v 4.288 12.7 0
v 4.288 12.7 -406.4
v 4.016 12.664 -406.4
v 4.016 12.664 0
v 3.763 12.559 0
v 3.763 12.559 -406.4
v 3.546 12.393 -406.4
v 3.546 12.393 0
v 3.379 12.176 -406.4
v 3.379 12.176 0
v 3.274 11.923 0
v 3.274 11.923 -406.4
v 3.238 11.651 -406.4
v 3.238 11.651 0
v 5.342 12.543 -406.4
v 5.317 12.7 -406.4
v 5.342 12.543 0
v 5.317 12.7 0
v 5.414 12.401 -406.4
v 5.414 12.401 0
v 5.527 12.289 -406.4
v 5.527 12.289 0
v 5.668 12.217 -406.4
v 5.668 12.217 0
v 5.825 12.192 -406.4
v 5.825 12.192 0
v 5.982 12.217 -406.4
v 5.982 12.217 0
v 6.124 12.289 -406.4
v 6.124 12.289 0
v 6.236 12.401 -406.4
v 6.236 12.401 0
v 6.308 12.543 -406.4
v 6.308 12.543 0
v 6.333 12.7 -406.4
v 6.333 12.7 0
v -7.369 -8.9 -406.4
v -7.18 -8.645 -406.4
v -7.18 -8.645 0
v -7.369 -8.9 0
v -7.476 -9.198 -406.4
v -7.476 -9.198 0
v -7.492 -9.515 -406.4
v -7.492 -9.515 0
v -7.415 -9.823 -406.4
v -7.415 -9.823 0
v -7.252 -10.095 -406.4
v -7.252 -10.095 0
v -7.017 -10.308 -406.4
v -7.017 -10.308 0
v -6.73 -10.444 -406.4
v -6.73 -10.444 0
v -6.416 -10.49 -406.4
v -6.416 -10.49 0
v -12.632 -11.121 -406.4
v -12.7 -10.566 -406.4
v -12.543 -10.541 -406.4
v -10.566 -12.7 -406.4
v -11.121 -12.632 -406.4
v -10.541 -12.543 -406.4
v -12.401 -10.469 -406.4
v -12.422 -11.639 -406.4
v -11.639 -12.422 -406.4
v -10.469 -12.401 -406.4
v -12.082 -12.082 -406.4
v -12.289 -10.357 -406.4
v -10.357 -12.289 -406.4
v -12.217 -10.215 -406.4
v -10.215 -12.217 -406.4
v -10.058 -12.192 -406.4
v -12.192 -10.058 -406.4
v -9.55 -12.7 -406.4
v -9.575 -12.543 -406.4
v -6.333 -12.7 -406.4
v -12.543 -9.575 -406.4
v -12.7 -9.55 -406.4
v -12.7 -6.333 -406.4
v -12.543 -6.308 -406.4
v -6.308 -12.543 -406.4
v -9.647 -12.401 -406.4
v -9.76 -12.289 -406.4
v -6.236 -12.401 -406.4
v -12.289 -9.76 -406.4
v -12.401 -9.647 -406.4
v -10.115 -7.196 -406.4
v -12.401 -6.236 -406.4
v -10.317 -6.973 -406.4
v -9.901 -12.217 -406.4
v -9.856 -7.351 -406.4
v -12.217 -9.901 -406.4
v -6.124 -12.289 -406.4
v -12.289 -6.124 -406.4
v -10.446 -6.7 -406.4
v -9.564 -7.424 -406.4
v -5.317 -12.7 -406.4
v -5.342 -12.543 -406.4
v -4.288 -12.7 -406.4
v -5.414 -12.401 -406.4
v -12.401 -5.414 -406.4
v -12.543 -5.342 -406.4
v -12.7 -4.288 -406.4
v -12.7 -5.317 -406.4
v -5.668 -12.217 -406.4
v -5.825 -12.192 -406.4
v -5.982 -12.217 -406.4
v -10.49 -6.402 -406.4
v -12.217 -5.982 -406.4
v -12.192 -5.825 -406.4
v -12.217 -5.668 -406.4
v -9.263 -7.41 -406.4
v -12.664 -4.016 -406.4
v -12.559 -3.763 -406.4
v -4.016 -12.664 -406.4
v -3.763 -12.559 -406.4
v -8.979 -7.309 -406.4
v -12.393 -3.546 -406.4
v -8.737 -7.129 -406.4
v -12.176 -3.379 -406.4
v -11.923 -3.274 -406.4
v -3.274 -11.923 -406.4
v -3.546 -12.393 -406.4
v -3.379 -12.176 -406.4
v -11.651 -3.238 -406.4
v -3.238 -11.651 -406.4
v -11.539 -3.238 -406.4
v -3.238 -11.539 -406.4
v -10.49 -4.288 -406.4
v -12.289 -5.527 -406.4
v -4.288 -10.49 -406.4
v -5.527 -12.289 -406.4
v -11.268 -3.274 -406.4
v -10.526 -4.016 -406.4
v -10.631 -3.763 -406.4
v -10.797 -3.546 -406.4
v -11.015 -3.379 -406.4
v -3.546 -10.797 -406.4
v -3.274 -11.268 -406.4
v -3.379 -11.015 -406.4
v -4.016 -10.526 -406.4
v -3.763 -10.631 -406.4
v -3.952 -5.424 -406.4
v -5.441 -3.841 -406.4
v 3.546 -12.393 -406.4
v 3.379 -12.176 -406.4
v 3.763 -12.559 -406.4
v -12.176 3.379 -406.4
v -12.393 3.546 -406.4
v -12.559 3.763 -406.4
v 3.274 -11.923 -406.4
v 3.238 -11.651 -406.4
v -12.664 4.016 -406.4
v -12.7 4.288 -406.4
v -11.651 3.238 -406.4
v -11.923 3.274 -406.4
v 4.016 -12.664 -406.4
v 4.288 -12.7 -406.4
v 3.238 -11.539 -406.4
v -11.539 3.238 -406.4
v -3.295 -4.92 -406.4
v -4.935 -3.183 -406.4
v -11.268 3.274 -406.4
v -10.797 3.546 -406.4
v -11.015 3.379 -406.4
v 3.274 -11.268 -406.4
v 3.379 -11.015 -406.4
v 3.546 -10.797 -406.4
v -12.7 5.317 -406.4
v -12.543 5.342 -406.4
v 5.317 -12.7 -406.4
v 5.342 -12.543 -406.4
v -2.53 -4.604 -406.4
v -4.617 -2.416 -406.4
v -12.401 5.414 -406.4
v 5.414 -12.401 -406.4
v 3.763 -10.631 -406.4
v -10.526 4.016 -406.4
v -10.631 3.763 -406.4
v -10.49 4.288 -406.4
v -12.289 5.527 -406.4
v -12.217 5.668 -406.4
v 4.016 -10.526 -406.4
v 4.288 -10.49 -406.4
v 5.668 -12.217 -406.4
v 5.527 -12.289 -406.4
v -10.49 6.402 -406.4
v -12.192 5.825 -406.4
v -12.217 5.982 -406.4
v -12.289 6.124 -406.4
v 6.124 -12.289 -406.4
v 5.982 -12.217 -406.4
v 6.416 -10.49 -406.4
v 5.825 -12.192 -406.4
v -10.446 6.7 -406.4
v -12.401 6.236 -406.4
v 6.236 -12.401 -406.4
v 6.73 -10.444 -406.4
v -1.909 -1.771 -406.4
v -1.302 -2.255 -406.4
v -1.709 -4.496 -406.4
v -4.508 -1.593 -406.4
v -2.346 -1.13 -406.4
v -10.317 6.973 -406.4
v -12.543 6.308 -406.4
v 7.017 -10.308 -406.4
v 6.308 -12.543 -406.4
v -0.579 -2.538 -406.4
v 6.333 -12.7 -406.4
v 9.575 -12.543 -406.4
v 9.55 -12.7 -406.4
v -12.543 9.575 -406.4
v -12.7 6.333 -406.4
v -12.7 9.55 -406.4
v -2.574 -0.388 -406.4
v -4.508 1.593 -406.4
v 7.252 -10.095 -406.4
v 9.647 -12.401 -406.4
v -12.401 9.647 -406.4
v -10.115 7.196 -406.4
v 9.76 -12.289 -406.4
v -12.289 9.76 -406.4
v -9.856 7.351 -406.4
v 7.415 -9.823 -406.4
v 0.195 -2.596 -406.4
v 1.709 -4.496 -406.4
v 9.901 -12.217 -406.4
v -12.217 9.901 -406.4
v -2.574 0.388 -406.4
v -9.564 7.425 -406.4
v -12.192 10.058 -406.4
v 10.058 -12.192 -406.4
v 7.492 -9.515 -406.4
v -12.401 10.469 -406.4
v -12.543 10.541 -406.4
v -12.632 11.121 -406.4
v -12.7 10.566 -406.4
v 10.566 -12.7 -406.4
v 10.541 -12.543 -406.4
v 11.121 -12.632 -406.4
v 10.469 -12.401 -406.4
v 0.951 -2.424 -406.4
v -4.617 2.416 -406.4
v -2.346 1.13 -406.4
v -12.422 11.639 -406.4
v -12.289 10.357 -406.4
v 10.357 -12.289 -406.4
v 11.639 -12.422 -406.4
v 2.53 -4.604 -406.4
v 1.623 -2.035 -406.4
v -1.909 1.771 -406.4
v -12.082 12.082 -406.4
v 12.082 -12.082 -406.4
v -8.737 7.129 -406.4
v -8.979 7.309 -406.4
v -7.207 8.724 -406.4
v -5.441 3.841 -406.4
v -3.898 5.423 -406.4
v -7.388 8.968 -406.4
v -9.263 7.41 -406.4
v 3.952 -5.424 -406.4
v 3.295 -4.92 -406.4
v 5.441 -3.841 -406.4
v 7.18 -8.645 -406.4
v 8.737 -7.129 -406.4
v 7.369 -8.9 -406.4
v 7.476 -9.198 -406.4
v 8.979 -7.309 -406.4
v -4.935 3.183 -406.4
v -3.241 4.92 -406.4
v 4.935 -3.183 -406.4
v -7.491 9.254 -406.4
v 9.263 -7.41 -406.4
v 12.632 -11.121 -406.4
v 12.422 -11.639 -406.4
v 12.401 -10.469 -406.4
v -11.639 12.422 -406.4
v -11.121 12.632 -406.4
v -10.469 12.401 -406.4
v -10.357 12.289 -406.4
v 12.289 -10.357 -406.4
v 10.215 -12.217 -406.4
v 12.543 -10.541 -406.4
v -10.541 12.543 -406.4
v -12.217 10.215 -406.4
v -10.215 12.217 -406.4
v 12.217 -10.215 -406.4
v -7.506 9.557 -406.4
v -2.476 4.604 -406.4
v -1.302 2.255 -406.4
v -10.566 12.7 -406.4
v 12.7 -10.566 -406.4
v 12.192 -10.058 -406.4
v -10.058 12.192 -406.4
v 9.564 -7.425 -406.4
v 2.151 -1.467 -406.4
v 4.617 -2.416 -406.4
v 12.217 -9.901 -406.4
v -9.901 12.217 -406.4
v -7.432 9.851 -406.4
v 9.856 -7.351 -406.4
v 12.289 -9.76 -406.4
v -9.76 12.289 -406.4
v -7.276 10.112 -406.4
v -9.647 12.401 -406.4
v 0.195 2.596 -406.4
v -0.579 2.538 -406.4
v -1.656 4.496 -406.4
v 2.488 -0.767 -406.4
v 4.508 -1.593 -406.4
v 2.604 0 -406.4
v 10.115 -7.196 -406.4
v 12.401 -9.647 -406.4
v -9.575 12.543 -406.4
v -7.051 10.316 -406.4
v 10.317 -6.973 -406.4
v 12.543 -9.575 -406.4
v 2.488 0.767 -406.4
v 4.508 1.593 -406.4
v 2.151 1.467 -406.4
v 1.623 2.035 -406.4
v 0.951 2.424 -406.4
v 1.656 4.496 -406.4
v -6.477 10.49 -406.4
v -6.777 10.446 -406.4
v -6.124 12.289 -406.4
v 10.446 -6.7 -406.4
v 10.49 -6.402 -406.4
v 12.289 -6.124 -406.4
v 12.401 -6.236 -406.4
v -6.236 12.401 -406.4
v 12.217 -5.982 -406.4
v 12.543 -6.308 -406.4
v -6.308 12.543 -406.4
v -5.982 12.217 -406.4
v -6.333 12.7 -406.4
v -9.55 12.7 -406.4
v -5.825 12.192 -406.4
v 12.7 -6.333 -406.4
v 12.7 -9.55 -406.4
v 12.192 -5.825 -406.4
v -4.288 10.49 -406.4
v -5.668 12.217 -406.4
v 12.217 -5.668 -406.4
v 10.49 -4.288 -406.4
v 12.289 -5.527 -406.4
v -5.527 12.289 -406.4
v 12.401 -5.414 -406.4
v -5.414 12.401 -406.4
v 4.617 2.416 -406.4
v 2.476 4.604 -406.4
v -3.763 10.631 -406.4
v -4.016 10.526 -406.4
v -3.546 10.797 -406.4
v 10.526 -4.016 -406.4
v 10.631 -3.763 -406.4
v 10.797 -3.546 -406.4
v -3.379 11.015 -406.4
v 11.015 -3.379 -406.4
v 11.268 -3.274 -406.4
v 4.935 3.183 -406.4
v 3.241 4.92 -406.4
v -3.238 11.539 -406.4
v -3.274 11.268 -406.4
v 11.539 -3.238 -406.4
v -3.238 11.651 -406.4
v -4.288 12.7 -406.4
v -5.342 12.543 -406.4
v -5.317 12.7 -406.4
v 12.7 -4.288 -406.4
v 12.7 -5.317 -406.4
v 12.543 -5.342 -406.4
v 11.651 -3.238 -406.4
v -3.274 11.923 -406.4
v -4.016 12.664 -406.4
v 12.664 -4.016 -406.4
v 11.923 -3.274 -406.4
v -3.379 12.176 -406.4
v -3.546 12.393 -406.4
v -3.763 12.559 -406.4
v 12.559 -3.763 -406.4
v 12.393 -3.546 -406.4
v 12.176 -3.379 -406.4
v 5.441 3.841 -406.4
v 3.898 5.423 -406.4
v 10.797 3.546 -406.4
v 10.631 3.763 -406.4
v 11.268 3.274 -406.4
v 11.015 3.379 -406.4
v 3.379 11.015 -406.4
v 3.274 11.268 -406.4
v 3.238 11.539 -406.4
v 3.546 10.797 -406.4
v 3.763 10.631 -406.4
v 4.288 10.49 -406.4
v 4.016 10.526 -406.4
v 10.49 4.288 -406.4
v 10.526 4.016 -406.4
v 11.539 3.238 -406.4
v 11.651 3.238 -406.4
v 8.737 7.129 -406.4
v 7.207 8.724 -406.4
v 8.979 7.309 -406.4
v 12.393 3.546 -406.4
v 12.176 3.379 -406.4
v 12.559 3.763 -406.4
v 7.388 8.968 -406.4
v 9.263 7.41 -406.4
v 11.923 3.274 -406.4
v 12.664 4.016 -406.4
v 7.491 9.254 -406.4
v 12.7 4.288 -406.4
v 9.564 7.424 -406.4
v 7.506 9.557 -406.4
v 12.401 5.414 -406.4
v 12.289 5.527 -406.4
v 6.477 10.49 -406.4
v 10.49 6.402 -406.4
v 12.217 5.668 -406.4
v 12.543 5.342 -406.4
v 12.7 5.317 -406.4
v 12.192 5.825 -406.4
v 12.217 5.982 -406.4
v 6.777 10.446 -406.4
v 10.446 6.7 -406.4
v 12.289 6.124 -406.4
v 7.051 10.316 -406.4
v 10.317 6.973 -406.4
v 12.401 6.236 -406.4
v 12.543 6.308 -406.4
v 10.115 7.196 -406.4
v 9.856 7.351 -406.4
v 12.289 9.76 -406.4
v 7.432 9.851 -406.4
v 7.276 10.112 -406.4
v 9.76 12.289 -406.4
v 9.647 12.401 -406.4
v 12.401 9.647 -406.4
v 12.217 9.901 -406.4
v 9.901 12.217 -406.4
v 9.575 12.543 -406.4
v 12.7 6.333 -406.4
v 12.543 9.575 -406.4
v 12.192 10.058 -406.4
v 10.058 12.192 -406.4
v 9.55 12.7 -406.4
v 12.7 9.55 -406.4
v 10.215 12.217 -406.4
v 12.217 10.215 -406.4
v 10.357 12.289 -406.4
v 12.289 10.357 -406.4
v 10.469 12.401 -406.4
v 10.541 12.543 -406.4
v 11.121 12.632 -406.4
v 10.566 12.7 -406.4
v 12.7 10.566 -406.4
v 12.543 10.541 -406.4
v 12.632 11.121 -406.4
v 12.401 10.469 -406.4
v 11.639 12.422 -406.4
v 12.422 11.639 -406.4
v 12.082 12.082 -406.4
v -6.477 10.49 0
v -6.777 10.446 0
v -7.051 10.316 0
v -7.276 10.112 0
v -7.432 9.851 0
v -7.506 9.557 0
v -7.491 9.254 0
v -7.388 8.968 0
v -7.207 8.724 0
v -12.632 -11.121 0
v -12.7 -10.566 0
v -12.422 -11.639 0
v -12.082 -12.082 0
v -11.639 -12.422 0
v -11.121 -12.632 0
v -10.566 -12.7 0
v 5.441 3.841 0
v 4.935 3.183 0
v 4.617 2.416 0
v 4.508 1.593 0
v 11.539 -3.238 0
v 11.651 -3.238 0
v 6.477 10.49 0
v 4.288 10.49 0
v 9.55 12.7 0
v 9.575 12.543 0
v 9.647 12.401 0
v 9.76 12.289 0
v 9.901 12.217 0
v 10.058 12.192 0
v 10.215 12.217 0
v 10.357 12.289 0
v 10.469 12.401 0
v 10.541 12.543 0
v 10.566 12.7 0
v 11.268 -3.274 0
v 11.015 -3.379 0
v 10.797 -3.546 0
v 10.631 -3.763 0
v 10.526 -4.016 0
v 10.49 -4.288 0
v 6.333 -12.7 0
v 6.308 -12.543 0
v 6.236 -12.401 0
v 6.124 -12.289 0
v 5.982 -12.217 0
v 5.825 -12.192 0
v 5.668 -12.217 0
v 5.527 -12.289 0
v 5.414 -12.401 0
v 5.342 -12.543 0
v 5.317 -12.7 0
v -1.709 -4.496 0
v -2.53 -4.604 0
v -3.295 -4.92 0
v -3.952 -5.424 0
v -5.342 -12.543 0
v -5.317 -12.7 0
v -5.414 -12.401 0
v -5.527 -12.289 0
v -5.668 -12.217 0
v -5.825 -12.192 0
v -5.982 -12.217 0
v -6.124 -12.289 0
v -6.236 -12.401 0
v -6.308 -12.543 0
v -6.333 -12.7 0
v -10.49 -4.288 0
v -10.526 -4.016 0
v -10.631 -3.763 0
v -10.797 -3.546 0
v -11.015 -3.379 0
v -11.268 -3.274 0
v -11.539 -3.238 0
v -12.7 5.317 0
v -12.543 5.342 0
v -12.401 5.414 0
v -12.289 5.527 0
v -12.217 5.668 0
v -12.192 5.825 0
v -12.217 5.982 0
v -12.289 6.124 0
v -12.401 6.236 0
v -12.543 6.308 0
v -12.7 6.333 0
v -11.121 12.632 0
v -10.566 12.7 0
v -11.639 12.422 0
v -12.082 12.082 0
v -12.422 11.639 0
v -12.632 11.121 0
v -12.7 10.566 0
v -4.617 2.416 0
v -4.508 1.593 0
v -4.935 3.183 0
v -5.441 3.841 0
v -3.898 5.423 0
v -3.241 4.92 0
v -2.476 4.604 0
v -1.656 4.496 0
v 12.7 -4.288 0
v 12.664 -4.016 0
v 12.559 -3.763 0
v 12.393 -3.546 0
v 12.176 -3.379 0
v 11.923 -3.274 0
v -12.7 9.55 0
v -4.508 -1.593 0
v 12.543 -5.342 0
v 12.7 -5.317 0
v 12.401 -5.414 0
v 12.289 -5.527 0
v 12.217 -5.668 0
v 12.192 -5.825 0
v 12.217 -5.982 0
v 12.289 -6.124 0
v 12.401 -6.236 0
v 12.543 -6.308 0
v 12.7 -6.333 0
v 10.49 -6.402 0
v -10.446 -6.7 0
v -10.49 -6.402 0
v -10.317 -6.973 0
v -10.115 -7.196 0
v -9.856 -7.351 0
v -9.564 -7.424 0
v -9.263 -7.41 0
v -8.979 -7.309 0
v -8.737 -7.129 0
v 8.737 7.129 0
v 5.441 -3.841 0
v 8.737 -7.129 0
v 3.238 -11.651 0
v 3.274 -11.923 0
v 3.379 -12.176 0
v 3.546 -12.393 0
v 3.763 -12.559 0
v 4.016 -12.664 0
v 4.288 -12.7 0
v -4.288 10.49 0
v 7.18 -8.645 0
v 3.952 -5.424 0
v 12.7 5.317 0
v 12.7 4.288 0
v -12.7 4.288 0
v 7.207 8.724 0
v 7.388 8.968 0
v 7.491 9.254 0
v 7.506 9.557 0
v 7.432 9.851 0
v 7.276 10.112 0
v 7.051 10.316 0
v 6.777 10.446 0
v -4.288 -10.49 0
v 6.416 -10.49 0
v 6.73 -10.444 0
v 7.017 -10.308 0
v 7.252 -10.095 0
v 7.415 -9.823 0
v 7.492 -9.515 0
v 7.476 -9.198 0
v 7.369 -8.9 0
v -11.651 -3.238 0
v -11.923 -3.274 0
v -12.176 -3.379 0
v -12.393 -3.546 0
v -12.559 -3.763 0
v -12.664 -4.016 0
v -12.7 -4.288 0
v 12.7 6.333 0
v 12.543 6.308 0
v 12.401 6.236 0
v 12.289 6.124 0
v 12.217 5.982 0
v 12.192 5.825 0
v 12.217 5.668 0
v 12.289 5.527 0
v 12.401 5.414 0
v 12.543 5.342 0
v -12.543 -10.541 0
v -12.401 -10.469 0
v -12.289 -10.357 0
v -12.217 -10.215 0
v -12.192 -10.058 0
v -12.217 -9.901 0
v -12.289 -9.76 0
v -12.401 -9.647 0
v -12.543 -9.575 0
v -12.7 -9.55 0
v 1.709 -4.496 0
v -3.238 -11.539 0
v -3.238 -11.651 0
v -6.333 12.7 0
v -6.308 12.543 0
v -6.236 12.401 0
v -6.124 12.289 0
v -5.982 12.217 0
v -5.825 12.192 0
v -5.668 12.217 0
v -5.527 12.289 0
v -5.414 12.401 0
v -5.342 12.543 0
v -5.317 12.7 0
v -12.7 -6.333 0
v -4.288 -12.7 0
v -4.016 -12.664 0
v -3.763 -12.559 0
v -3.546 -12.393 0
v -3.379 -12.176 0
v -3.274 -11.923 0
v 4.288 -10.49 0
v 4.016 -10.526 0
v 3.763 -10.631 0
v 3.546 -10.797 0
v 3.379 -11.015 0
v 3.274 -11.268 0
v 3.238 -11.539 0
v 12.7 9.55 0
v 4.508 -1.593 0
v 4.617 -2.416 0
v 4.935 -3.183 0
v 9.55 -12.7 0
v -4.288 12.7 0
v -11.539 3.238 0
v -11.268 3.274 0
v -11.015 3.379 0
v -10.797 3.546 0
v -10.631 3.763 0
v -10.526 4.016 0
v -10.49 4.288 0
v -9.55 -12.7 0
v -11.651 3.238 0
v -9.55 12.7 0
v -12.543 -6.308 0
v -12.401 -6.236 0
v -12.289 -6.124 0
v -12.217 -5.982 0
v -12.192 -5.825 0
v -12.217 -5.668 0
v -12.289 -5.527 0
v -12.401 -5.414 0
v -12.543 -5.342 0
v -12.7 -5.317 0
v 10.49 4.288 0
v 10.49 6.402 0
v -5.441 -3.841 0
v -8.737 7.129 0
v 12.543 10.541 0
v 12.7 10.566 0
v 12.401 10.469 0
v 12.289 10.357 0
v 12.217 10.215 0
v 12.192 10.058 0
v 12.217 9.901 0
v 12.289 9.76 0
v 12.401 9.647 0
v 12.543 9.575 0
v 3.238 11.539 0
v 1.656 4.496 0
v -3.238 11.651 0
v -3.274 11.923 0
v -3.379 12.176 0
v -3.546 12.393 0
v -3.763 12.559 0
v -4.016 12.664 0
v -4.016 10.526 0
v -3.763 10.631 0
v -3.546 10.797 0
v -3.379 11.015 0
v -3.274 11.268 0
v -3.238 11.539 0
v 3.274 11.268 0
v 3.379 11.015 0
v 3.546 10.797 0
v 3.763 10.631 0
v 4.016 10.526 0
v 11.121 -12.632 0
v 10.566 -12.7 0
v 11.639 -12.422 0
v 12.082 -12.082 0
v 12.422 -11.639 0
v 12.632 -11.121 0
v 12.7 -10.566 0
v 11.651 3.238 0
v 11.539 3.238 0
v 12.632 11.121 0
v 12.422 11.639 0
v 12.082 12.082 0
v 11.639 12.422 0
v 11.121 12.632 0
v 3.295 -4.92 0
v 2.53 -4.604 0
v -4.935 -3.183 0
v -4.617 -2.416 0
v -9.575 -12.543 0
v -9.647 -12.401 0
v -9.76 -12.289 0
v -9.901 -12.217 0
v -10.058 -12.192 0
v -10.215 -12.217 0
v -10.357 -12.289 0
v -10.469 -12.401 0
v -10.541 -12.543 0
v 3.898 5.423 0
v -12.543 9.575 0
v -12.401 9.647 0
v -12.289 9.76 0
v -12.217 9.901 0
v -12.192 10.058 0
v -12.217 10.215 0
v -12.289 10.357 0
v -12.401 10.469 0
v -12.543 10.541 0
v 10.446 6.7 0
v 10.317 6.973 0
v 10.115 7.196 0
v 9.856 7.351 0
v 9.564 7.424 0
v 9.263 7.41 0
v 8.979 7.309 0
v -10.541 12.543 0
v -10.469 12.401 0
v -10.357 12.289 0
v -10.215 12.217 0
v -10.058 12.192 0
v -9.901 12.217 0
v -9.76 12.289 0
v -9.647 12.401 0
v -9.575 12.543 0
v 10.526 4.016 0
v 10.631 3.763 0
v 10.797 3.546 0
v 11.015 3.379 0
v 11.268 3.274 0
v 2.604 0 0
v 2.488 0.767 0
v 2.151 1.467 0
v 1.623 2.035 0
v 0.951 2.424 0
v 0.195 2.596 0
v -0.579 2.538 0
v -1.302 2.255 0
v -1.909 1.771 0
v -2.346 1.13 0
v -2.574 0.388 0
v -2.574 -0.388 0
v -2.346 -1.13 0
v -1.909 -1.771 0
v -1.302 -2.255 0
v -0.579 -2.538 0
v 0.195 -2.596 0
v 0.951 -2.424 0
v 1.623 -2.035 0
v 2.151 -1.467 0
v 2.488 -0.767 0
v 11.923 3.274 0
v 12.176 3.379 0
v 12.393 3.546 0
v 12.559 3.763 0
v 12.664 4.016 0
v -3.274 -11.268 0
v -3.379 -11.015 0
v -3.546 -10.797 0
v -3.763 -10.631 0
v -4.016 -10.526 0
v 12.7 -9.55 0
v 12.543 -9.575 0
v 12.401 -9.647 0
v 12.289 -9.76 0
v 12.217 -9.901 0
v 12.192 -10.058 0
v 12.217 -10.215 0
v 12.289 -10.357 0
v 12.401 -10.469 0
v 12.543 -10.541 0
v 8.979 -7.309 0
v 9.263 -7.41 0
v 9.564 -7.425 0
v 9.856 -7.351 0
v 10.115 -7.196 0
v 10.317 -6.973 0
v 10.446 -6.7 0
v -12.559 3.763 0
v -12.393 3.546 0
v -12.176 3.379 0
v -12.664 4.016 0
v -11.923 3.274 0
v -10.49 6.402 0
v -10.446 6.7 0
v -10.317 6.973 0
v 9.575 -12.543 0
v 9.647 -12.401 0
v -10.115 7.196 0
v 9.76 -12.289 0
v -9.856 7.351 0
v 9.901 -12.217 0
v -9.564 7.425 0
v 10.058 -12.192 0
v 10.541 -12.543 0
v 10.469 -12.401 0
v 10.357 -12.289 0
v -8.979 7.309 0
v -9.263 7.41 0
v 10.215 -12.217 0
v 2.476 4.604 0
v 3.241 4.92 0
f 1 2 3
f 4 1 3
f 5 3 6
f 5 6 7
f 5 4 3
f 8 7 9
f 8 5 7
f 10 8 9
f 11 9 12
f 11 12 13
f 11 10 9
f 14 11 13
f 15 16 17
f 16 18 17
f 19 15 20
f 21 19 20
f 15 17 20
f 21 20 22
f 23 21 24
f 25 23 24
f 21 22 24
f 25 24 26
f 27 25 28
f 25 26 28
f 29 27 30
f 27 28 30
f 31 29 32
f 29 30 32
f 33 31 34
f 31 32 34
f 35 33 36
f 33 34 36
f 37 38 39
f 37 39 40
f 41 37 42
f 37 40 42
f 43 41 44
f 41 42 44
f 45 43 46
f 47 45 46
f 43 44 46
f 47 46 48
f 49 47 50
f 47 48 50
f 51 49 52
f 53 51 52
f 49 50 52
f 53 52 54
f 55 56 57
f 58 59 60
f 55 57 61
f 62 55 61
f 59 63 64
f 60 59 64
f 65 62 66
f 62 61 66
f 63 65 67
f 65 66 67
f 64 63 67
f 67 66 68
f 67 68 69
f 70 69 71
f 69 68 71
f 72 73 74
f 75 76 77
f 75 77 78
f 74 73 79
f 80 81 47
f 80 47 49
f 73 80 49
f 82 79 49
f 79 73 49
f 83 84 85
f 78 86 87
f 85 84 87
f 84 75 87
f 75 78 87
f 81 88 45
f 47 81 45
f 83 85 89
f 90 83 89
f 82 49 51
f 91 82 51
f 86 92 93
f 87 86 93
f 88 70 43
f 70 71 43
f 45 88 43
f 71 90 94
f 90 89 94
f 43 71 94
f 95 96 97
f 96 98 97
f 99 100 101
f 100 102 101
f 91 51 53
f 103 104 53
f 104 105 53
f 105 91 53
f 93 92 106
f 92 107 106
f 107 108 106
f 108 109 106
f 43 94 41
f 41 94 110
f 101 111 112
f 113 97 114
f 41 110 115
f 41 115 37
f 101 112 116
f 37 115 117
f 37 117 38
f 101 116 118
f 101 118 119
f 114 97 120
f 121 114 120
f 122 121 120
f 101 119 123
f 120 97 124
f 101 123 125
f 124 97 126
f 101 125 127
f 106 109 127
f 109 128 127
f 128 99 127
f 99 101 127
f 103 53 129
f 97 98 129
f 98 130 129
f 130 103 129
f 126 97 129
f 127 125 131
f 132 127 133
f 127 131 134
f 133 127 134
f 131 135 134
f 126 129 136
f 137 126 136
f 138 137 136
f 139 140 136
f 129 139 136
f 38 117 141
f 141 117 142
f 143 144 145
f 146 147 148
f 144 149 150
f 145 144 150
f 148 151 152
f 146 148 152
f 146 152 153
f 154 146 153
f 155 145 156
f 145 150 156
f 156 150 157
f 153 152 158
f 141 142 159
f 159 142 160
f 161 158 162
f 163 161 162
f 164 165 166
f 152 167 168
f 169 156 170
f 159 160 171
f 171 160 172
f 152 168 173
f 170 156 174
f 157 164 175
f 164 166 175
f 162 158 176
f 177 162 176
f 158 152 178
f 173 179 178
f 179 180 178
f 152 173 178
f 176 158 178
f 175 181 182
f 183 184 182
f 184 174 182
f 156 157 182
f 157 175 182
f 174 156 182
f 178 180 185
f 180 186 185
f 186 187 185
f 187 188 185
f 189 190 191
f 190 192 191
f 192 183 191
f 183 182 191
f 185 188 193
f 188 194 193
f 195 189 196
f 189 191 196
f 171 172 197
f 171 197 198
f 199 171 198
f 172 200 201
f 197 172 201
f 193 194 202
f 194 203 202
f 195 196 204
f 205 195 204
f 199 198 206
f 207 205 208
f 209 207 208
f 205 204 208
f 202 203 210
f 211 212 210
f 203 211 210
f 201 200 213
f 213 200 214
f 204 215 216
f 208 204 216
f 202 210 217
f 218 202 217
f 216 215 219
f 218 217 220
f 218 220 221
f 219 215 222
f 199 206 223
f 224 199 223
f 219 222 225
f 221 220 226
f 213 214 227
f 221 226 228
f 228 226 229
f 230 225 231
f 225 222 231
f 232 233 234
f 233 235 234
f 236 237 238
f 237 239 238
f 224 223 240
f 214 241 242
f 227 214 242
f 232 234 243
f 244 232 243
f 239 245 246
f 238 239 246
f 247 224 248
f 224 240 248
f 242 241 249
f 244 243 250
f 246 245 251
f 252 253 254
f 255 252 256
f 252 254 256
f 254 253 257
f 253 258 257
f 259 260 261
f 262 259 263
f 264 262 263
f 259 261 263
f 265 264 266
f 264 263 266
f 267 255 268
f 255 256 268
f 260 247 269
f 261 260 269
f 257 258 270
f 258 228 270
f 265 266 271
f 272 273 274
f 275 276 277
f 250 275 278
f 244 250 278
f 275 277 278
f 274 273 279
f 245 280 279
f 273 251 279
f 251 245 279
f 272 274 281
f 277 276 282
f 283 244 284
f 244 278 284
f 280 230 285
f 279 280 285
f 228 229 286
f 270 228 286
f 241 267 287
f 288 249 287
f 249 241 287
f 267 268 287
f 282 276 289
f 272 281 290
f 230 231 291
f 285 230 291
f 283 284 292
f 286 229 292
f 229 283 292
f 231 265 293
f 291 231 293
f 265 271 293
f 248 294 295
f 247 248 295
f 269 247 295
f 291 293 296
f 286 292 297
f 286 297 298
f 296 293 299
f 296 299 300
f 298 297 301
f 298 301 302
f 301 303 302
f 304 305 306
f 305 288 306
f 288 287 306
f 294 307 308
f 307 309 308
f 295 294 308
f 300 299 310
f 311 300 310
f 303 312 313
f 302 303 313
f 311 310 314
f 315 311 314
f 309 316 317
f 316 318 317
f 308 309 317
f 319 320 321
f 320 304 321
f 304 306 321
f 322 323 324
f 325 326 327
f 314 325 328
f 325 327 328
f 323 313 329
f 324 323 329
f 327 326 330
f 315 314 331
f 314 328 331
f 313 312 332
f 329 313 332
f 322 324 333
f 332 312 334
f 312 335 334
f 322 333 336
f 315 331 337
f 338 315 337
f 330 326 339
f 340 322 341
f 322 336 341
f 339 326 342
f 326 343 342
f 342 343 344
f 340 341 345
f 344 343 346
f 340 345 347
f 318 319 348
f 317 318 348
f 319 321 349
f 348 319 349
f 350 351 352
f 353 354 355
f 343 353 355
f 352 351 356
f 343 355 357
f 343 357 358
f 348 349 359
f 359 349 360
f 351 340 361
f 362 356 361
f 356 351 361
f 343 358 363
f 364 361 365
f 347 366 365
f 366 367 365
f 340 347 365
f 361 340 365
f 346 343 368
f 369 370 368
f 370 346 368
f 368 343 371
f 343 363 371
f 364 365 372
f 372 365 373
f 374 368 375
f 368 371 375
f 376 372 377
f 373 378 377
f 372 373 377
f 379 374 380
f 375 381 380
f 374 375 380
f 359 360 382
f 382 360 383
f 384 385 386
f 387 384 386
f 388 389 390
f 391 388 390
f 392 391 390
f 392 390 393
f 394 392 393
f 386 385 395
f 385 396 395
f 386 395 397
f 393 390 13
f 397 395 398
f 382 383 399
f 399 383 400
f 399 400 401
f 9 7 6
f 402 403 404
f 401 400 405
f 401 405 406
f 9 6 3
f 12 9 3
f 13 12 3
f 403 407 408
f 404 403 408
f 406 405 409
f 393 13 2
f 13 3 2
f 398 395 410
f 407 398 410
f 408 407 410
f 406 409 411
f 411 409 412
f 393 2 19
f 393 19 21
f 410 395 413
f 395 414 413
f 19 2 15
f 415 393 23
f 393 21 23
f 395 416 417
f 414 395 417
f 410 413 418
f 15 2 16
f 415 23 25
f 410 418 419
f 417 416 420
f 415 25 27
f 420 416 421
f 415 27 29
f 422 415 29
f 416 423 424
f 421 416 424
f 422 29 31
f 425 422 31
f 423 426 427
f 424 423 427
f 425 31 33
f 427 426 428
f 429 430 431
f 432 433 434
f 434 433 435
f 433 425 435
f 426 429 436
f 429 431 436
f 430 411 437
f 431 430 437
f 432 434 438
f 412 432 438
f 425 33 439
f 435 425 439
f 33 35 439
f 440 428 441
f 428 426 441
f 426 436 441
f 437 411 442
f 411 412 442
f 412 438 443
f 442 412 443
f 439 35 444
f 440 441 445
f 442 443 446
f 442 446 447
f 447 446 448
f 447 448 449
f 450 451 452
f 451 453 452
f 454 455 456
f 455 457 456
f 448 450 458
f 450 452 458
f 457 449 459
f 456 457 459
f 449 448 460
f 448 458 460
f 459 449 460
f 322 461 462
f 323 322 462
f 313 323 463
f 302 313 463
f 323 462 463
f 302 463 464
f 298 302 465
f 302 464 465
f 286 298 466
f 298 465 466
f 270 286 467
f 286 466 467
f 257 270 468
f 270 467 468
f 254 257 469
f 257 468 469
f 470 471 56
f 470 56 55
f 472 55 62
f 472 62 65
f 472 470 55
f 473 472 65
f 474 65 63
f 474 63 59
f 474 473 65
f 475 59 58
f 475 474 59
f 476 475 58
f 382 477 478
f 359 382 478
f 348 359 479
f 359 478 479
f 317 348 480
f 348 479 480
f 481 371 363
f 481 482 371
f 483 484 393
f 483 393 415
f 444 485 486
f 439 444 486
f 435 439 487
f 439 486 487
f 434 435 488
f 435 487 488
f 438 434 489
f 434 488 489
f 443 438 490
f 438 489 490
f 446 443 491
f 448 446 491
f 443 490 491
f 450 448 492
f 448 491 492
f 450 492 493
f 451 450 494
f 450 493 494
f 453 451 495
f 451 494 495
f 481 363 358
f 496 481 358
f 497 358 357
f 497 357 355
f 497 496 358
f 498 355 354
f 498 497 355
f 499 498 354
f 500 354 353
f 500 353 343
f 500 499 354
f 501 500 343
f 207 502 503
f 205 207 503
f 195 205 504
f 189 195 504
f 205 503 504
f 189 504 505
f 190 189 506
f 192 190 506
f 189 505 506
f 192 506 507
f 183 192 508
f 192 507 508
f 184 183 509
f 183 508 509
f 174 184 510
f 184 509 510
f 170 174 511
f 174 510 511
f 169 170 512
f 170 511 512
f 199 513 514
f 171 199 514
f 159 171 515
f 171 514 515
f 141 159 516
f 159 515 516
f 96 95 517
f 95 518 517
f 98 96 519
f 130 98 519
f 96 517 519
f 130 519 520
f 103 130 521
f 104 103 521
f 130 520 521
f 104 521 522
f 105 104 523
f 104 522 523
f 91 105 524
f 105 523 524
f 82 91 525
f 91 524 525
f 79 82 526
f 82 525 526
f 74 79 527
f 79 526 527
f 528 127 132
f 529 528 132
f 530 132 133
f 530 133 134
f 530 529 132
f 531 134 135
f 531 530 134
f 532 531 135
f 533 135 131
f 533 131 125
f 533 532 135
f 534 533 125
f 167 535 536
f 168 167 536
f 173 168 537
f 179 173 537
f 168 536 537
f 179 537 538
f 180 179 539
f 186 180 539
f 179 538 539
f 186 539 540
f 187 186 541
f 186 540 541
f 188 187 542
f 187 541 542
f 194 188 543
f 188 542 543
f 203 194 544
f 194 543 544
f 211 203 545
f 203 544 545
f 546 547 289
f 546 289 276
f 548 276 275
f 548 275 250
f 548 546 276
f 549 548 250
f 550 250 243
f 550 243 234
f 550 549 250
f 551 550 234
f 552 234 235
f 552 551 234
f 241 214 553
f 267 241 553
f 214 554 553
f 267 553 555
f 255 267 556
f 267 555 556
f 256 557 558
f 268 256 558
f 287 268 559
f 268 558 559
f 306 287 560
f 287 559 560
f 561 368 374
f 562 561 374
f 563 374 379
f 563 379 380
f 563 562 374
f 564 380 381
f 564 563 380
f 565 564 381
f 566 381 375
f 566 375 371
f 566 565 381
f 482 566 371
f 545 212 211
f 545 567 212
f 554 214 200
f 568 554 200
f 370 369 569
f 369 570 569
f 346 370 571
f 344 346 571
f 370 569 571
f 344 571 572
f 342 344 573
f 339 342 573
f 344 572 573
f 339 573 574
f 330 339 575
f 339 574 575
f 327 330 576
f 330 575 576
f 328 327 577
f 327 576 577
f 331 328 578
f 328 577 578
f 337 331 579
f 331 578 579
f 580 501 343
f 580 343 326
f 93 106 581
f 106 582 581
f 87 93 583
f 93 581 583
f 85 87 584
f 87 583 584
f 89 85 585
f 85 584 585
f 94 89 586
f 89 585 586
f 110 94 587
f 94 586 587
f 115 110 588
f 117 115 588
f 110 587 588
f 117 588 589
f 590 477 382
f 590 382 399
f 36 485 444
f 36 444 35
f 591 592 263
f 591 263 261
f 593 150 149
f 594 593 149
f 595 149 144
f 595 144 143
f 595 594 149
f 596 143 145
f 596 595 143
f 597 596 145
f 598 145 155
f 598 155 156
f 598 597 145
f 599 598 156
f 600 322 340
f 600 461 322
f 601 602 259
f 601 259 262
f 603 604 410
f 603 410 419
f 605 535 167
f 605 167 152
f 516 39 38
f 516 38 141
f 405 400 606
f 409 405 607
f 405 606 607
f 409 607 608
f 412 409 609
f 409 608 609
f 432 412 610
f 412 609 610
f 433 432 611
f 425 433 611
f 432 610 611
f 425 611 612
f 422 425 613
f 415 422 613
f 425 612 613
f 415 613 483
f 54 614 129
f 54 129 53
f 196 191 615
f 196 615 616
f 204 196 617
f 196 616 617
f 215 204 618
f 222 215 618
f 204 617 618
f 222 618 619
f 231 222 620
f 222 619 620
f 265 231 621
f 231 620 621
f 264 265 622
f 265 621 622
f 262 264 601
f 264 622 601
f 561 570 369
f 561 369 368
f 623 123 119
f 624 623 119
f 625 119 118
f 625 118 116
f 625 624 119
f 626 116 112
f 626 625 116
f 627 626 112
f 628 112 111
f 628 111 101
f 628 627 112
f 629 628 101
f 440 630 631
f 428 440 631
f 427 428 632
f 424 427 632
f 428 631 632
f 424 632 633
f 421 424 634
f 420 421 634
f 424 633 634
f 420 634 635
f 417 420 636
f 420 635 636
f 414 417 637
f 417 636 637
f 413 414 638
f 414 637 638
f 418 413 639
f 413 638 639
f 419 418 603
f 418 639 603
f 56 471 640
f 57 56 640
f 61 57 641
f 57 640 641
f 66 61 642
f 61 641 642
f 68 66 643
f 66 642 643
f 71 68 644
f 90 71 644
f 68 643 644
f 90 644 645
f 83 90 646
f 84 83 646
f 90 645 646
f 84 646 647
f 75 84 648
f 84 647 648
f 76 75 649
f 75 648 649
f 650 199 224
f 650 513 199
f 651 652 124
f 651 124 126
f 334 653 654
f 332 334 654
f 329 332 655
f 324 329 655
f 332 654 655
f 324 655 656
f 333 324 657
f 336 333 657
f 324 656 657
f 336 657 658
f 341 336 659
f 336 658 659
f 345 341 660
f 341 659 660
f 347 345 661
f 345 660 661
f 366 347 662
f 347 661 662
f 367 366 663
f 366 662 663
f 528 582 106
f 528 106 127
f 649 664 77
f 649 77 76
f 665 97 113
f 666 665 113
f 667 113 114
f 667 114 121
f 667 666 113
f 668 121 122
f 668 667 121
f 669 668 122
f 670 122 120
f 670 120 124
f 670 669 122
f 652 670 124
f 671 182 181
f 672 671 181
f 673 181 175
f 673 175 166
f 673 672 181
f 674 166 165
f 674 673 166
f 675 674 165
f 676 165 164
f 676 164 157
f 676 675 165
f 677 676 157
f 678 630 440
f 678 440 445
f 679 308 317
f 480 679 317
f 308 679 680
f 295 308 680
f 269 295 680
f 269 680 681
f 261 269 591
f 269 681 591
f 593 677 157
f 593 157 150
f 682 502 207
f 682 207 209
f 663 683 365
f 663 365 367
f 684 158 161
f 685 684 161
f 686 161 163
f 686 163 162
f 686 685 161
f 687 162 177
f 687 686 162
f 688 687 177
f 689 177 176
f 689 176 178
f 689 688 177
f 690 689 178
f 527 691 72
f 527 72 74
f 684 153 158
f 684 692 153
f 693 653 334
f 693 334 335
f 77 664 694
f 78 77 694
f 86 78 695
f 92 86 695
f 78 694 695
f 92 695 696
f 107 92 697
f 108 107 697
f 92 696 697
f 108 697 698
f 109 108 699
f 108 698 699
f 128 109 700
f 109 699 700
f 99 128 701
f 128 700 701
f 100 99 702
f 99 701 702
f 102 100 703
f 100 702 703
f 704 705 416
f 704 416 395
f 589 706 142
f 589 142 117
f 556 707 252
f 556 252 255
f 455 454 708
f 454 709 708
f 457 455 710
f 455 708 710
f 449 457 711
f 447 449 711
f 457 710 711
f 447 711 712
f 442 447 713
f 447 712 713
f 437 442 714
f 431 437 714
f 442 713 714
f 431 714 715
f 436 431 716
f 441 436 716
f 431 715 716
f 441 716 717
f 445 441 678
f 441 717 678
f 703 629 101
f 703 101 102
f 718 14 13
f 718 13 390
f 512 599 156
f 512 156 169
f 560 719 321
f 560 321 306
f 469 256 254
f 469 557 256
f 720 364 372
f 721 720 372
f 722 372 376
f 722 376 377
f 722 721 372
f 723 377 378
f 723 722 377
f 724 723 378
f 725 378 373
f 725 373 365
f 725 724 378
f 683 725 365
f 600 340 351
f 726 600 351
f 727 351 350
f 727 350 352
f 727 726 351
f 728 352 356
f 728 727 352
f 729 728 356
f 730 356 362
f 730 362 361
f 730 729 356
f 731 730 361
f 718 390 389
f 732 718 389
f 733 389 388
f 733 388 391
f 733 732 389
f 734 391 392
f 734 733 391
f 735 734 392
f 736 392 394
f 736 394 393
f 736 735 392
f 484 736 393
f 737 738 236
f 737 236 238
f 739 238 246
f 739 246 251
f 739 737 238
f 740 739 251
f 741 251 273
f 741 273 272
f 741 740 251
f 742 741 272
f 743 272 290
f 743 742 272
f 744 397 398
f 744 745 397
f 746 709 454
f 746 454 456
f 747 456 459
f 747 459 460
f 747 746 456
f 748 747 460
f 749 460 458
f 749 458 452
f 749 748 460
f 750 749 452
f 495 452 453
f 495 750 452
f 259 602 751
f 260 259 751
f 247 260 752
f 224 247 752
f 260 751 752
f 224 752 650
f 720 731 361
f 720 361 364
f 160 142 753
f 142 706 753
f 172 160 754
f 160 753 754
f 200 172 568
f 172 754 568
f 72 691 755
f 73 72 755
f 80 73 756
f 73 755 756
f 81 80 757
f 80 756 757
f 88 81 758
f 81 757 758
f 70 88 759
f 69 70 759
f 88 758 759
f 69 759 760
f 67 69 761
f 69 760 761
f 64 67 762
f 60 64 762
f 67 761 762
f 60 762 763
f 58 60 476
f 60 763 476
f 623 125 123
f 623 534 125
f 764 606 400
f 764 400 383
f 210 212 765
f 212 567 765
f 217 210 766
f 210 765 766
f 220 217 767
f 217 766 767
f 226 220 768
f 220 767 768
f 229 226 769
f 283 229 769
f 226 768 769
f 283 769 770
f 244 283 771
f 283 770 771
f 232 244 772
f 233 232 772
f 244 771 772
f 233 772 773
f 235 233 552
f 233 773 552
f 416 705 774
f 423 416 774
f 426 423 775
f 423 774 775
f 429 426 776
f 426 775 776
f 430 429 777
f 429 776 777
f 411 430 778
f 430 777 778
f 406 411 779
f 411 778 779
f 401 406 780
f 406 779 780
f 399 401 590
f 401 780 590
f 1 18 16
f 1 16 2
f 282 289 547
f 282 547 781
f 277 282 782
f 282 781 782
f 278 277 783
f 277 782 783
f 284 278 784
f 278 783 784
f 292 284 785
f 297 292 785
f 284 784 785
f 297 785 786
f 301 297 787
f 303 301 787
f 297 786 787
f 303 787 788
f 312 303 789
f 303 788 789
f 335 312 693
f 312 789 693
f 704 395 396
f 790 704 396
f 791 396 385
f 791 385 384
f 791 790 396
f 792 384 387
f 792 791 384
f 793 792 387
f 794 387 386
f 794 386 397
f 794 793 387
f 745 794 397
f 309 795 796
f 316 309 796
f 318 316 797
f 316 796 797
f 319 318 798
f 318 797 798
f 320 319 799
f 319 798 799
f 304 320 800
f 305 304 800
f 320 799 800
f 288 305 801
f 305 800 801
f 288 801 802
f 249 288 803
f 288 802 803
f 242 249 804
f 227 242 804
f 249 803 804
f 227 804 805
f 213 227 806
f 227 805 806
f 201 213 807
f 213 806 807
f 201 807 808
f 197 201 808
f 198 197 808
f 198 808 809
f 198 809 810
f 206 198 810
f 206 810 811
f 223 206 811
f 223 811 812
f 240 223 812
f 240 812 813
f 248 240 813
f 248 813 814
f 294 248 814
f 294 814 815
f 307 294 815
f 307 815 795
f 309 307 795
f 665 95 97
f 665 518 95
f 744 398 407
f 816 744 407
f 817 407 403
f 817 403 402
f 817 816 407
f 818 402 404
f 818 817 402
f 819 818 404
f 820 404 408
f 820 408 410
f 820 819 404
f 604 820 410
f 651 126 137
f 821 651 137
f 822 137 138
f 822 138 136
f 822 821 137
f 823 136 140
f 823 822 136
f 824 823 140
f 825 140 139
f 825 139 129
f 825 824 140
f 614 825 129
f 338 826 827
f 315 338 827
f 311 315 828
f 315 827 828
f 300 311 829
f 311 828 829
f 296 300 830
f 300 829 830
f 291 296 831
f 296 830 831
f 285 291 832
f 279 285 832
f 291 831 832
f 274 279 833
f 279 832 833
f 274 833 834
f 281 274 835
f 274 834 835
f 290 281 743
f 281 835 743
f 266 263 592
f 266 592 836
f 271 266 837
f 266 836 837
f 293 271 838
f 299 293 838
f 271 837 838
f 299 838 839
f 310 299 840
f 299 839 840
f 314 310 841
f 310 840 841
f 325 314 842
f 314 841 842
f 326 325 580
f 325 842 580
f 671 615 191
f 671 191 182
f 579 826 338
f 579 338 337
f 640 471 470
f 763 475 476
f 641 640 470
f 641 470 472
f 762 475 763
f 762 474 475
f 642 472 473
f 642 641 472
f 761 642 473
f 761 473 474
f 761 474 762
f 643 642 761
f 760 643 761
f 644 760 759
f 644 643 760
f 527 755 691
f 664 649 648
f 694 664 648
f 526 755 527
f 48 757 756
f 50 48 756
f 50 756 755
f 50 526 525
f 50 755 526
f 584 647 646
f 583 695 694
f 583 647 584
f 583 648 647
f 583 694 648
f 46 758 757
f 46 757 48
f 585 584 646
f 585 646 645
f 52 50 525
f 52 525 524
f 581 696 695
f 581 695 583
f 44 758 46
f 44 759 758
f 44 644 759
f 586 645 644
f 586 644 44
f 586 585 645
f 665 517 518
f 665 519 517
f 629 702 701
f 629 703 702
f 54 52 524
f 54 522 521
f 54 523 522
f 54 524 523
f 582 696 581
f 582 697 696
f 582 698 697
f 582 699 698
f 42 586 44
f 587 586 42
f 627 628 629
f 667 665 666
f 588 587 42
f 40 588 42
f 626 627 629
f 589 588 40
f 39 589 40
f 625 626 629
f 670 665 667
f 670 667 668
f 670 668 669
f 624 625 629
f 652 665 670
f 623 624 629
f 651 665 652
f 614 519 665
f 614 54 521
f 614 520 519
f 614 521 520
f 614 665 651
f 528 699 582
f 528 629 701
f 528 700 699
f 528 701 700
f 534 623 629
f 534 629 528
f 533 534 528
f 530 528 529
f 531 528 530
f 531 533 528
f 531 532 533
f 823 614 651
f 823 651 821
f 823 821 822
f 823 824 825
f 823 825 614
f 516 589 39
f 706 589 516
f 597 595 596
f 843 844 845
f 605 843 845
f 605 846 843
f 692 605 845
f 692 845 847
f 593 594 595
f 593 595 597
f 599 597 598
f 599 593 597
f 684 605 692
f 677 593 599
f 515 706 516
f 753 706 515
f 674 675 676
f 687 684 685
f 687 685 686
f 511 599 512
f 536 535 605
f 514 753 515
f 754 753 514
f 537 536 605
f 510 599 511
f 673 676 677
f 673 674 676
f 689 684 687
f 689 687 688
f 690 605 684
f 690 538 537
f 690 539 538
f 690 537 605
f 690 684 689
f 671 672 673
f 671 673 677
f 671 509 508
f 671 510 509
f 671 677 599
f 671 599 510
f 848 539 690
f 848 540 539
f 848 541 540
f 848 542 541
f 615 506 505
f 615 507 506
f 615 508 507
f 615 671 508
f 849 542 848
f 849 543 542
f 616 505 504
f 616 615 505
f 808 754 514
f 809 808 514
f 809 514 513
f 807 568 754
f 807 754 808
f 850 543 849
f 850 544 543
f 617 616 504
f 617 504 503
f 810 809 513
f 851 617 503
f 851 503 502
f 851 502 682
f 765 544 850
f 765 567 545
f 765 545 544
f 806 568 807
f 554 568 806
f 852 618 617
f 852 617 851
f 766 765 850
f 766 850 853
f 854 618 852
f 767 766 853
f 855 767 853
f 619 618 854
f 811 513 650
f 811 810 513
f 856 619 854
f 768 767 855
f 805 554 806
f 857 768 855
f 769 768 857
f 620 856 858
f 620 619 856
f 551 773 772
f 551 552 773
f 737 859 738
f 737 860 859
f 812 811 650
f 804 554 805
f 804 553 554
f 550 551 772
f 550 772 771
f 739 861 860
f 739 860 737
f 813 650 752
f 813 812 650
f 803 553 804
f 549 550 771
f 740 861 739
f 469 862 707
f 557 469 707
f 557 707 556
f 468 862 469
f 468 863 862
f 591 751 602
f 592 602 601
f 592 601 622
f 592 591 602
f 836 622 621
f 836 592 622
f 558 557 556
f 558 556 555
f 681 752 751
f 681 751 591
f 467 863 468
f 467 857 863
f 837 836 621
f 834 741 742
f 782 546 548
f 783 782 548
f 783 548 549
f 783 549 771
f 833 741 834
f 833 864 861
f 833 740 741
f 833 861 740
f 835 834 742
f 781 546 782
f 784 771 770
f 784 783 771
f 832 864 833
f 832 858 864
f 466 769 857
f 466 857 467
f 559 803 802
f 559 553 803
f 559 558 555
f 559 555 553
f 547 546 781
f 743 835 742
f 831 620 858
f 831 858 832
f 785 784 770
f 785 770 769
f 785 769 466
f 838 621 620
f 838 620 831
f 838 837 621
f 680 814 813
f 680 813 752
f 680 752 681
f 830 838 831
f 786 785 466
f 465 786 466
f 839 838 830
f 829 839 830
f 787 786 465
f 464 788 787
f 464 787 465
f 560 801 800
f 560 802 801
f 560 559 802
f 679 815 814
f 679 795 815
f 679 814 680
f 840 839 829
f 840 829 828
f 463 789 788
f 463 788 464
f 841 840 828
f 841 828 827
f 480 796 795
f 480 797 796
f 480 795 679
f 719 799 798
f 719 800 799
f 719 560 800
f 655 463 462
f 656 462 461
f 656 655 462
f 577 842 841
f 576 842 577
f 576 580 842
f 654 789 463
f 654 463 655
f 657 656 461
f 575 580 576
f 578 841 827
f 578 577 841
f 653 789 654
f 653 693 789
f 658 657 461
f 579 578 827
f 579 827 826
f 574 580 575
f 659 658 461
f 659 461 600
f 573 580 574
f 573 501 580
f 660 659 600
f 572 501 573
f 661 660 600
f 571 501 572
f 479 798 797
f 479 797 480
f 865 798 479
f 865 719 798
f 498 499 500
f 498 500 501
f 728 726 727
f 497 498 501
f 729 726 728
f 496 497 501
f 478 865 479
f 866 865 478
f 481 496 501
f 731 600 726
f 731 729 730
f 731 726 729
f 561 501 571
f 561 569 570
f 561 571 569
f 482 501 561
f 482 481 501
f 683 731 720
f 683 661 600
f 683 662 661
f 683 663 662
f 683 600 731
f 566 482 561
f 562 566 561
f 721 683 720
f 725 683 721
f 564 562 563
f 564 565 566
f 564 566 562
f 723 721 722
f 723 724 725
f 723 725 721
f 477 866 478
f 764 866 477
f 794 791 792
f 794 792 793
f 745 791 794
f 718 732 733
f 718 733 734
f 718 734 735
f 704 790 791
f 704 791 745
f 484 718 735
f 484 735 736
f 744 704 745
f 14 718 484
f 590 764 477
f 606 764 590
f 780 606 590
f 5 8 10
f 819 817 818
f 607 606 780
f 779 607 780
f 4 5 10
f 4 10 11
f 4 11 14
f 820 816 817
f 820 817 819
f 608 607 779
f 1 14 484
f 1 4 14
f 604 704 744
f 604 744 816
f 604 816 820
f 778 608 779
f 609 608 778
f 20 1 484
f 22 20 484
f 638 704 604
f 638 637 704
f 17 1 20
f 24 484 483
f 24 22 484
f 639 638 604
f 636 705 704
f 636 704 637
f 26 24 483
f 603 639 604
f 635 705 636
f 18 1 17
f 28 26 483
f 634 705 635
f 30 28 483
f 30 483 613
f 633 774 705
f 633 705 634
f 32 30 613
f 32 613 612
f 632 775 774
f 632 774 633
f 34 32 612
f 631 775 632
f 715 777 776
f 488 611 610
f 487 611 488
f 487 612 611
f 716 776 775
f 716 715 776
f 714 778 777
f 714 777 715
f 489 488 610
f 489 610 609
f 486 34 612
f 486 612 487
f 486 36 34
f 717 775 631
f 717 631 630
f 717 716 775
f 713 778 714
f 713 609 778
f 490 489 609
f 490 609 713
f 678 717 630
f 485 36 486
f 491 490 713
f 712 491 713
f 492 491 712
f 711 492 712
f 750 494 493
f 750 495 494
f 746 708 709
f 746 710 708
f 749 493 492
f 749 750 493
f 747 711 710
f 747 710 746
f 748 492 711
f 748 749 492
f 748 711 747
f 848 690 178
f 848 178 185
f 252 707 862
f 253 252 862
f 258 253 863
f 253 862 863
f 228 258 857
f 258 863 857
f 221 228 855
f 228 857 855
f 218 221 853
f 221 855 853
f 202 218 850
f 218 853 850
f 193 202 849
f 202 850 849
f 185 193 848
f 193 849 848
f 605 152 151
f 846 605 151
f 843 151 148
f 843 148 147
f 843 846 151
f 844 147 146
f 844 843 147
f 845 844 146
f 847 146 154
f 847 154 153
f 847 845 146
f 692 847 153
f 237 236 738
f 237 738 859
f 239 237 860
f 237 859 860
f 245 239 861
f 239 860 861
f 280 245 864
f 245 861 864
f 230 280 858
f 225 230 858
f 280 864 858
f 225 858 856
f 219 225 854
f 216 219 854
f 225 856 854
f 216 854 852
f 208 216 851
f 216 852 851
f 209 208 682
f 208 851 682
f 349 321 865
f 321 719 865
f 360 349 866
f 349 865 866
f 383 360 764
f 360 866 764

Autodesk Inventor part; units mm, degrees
ref_plane "YZ Plane" through (0, 0, 0) normal (1, 0, 0) x (0, 1, 0)
ref_plane "XZ Plane" through (0, 0, 0) normal (0, 1, 0) x (-1, 0, 0)
ref_plane "XY Plane" through (0, 0, 0) normal (0, 0, 1) x (1, 0, 0)
sketch "Sketch1" plane through (0, 0, 0) normal (0, 0, 1) x (1, 0, 0)
  circle A0 centre (0, 0) radius 2.6035
  arc A1 (-1.7093, -4.4958) -> (-3.9523, -5.4237) centre (-1.7093, -7.6708) ccw
  line L0 (-1.7093, -4.4958) -> (1.7093, -4.4958)
  arc A2 (3.9523, -5.4237) -> (1.7093, -4.4958) centre (1.7093, -7.6708) ccw
  line L1 (3.9523, -5.4237) -> (7.1797, -8.6452)
  arc A3 (6.4164, -10.4902) -> (7.1797, -8.6452) centre (6.4164, -9.4098) ccw
  line L2 (6.4164, -10.4902) -> (4.2875, -10.4902)
  arc A4 (4.2875, -10.4902) -> (3.2385, -11.5392) centre (4.2875, -11.5392) ccw
  line L3 (3.2385, -11.5392) -> (3.2385, -11.651)
  arc A5 (3.2385, -11.651) -> (4.2875, -12.7) centre (4.2875, -11.651) ccw
  line L4 (4.2875, -12.7) -> (5.3171, -12.7)
  arc A6 (6.3331, -12.7) -> (5.3171, -12.7) centre (5.8251, -12.7) ccw
  line L5 (6.3331, -12.7) -> (9.5504, -12.7)
  arc A7 (10.5664, -12.6998) -> (9.5504, -12.7) centre (10.0584, -12.7) ccw
  arc A8 (10.5664, -12.6998) -> (12.6998, -10.5664) centre (10.5918, -10.5918) ccw
  arc A9 (12.7, -9.5504) -> (12.6998, -10.5664) centre (12.7, -10.0584) ccw
  line L6 (12.7, -9.5504) -> (12.7, -6.3331)
  arc A10 (12.7, -5.3171) -> (12.7, -6.3331) centre (12.7, -5.8251) ccw
  line L7 (12.7, -5.3171) -> (12.7, -4.2875)
  arc A11 (12.7, -4.2875) -> (11.651, -3.2385) centre (11.651, -4.2875) ccw
  line L8 (11.651, -3.2385) -> (11.5392, -3.2385)
  arc A12 (11.5392, -3.2385) -> (10.4902, -4.2875) centre (11.5392, -4.2875) ccw
  line L9 (10.4902, -4.2875) -> (10.4902, -6.4021)
  arc A13 (8.7371, -7.1294) -> (10.4902, -6.4021) centre (9.4628, -6.4021) ccw
  line L10 (8.7371, -7.1294) -> (5.441, -3.8408)
  arc A14 (4.5085, -1.5932) -> (5.441, -3.8408) centre (7.6835, -1.5932) ccw
  line L11 (4.5085, -1.5932) -> (4.5085, 1.5932)
  arc A15 (5.441, 3.8408) -> (4.5085, 1.5932) centre (7.6835, 1.5932) ccw
  line L12 (5.441, 3.8408) -> (8.7371, 7.1294)
  arc A16 (10.4902, 6.4021) -> (8.7371, 7.1294) centre (9.4628, 6.4021) ccw
  line L13 (10.4902, 6.4021) -> (10.4902, 4.2875)
  arc A17 (10.4902, 4.2875) -> (11.5392, 3.2385) centre (11.5392, 4.2875) ccw
  line L14 (11.5392, 3.2385) -> (11.651, 3.2385)
  arc A18 (11.651, 3.2385) -> (12.7, 4.2875) centre (11.651, 4.2875) ccw
  line L15 (12.7, 4.2875) -> (12.7, 5.3171)
  arc A19 (12.7, 6.3331) -> (12.7, 5.3171) centre (12.7, 5.8251) ccw
  line L16 (12.7, 6.3331) -> (12.7, 9.5504)
  arc A20 (12.6998, 10.5664) -> (12.7, 9.5504) centre (12.7, 10.0584) ccw
  arc A21 (12.6998, 10.5664) -> (10.5664, 12.6998) centre (10.5918, 10.5918) ccw
  arc A22 (9.5504, 12.7) -> (10.5664, 12.6998) centre (10.0584, 12.7) ccw
  line L17 (9.5504, 12.7) -> (6.3331, 12.7)
  arc A23 (5.3171, 12.7) -> (6.3331, 12.7) centre (5.8251, 12.7) ccw
  line L18 (5.3171, 12.7) -> (4.2875, 12.7)
  arc A24 (4.2875, 12.7) -> (3.2385, 11.651) centre (4.2875, 11.651) ccw
  line L19 (3.2385, 11.651) -> (3.2385, 11.5392)
  arc A25 (3.2385, 11.5392) -> (4.2875, 10.4902) centre (4.2875, 11.5392) ccw
  line L20 (4.2875, 10.4902) -> (6.4768, 10.4902)
  arc A26 (7.207, 8.7244) -> (6.4768, 10.4902) centre (6.4768, 9.4563) ccw
  line L21 (7.207, 8.7244) -> (3.8983, 5.4232)
  arc A27 (1.6558, 4.4958) -> (3.8983, 5.4232) centre (1.6558, 7.6708) ccw
  line L22 (1.6558, 4.4958) -> (-1.6558, 4.4958)
  arc A28 (-3.8983, 5.4232) -> (-1.6558, 4.4958) centre (-1.6558, 7.6708) ccw
  line L23 (-3.8983, 5.4232) -> (-7.207, 8.7244)
  arc A29 (-6.4768, 10.4902) -> (-7.207, 8.7244) centre (-6.4768, 9.4563) ccw
  line L24 (-6.4768, 10.4902) -> (-4.2875, 10.4902)
  arc A30 (-4.2875, 10.4902) -> (-3.2385, 11.5392) centre (-4.2875, 11.5392) ccw
  line L25 (-3.2385, 11.5392) -> (-3.2385, 11.651)
  arc A31 (-3.2385, 11.651) -> (-4.2875, 12.7) centre (-4.2875, 11.651) ccw
  line L26 (-4.2875, 12.7) -> (-5.3171, 12.7)
  arc A32 (-6.3331, 12.7) -> (-5.3171, 12.7) centre (-5.8251, 12.7) ccw
  line L27 (-6.3331, 12.7) -> (-9.5504, 12.7)
  arc A33 (-10.5664, 12.6998) -> (-9.5504, 12.7) centre (-10.0584, 12.7) ccw
  arc A34 (-10.5664, 12.6998) -> (-12.6998, 10.5664) centre (-10.5918, 10.5918) ccw
  arc A35 (-12.7, 9.5504) -> (-12.6998, 10.5664) centre (-12.7, 10.0584) ccw
  line L28 (-12.7, 9.5504) -> (-12.7, 6.3331)
  arc A36 (-12.7, 5.3171) -> (-12.7, 6.3331) centre (-12.7, 5.8251) ccw
  line L29 (-12.7, 5.3171) -> (-12.7, 4.2875)
  arc A37 (-12.7, 4.2875) -> (-11.651, 3.2385) centre (-11.651, 4.2875) ccw
  line L30 (-11.651, 3.2385) -> (-11.5392, 3.2385)
  arc A38 (-11.5392, 3.2385) -> (-10.4902, 4.2875) centre (-11.5392, 4.2875) ccw
  line L31 (-10.4902, 4.2875) -> (-10.4902, 6.4021)
  arc A39 (-8.7371, 7.1294) -> (-10.4902, 6.4021) centre (-9.4628, 6.4021) ccw
  line L32 (-8.7371, 7.1294) -> (-5.441, 3.8408)
  arc A40 (-4.5085, 1.5932) -> (-5.441, 3.8408) centre (-7.6835, 1.5932) ccw
  line L33 (-4.5085, 1.5932) -> (-4.5085, -1.5932)
  arc A41 (-5.441, -3.8408) -> (-4.5085, -1.5932) centre (-7.6835, -1.5932) ccw
  line L34 (-5.441, -3.8408) -> (-8.7371, -7.1294)
  arc A42 (-10.4902, -6.4021) -> (-8.7371, -7.1294) centre (-9.4628, -6.4021) ccw
  line L35 (-10.4902, -6.4021) -> (-10.4902, -4.2875)
  arc A43 (-10.4902, -4.2875) -> (-11.5392, -3.2385) centre (-11.5392, -4.2875) ccw
  line L36 (-11.5392, -3.2385) -> (-11.651, -3.2385)
  arc A44 (-11.651, -3.2385) -> (-12.7, -4.2875) centre (-11.651, -4.2875) ccw
  line L37 (-12.7, -4.2875) -> (-12.7, -5.3171)
  arc A45 (-12.7, -6.3331) -> (-12.7, -5.3171) centre (-12.7, -5.8251) ccw
  line L38 (-12.7, -6.3331) -> (-12.7, -9.5504)
  arc A46 (-12.6998, -10.5664) -> (-12.7, -9.5504) centre (-12.7, -10.0584) ccw
  arc A47 (-12.6998, -10.5664) -> (-10.5664, -12.6998) centre (-10.5918, -10.5918) ccw
  arc A48 (-9.5504, -12.7) -> (-10.5664, -12.6998) centre (-10.0584, -12.7) ccw
  line L39 (-9.5504, -12.7) -> (-6.3331, -12.7)
  arc A49 (-5.3171, -12.7) -> (-6.3331, -12.7) centre (-5.8251, -12.7) ccw
  line L40 (-5.3171, -12.7) -> (-4.2875, -12.7)
  arc A50 (-4.2875, -12.7) -> (-3.2385, -11.651) centre (-4.2875, -11.651) ccw
  line L41 (-3.2385, -11.651) -> (-3.2385, -11.5392)
  arc A51 (-3.2385, -11.5392) -> (-4.2875, -10.4902) centre (-4.2875, -11.5392) ccw
  line L42 (-4.2875, -10.4902) -> (-6.4164, -10.4902)
  arc A52 (-7.1797, -8.6452) -> (-6.4164, -10.4902) centre (-6.4164, -9.4098) ccw
  line L43 (-7.1797, -8.6452) -> (-3.9523, -5.4237)
extrude "Extrusion1" add sketch "Sketch1" against normal blind 406.4
properties part number "1010 16in"
